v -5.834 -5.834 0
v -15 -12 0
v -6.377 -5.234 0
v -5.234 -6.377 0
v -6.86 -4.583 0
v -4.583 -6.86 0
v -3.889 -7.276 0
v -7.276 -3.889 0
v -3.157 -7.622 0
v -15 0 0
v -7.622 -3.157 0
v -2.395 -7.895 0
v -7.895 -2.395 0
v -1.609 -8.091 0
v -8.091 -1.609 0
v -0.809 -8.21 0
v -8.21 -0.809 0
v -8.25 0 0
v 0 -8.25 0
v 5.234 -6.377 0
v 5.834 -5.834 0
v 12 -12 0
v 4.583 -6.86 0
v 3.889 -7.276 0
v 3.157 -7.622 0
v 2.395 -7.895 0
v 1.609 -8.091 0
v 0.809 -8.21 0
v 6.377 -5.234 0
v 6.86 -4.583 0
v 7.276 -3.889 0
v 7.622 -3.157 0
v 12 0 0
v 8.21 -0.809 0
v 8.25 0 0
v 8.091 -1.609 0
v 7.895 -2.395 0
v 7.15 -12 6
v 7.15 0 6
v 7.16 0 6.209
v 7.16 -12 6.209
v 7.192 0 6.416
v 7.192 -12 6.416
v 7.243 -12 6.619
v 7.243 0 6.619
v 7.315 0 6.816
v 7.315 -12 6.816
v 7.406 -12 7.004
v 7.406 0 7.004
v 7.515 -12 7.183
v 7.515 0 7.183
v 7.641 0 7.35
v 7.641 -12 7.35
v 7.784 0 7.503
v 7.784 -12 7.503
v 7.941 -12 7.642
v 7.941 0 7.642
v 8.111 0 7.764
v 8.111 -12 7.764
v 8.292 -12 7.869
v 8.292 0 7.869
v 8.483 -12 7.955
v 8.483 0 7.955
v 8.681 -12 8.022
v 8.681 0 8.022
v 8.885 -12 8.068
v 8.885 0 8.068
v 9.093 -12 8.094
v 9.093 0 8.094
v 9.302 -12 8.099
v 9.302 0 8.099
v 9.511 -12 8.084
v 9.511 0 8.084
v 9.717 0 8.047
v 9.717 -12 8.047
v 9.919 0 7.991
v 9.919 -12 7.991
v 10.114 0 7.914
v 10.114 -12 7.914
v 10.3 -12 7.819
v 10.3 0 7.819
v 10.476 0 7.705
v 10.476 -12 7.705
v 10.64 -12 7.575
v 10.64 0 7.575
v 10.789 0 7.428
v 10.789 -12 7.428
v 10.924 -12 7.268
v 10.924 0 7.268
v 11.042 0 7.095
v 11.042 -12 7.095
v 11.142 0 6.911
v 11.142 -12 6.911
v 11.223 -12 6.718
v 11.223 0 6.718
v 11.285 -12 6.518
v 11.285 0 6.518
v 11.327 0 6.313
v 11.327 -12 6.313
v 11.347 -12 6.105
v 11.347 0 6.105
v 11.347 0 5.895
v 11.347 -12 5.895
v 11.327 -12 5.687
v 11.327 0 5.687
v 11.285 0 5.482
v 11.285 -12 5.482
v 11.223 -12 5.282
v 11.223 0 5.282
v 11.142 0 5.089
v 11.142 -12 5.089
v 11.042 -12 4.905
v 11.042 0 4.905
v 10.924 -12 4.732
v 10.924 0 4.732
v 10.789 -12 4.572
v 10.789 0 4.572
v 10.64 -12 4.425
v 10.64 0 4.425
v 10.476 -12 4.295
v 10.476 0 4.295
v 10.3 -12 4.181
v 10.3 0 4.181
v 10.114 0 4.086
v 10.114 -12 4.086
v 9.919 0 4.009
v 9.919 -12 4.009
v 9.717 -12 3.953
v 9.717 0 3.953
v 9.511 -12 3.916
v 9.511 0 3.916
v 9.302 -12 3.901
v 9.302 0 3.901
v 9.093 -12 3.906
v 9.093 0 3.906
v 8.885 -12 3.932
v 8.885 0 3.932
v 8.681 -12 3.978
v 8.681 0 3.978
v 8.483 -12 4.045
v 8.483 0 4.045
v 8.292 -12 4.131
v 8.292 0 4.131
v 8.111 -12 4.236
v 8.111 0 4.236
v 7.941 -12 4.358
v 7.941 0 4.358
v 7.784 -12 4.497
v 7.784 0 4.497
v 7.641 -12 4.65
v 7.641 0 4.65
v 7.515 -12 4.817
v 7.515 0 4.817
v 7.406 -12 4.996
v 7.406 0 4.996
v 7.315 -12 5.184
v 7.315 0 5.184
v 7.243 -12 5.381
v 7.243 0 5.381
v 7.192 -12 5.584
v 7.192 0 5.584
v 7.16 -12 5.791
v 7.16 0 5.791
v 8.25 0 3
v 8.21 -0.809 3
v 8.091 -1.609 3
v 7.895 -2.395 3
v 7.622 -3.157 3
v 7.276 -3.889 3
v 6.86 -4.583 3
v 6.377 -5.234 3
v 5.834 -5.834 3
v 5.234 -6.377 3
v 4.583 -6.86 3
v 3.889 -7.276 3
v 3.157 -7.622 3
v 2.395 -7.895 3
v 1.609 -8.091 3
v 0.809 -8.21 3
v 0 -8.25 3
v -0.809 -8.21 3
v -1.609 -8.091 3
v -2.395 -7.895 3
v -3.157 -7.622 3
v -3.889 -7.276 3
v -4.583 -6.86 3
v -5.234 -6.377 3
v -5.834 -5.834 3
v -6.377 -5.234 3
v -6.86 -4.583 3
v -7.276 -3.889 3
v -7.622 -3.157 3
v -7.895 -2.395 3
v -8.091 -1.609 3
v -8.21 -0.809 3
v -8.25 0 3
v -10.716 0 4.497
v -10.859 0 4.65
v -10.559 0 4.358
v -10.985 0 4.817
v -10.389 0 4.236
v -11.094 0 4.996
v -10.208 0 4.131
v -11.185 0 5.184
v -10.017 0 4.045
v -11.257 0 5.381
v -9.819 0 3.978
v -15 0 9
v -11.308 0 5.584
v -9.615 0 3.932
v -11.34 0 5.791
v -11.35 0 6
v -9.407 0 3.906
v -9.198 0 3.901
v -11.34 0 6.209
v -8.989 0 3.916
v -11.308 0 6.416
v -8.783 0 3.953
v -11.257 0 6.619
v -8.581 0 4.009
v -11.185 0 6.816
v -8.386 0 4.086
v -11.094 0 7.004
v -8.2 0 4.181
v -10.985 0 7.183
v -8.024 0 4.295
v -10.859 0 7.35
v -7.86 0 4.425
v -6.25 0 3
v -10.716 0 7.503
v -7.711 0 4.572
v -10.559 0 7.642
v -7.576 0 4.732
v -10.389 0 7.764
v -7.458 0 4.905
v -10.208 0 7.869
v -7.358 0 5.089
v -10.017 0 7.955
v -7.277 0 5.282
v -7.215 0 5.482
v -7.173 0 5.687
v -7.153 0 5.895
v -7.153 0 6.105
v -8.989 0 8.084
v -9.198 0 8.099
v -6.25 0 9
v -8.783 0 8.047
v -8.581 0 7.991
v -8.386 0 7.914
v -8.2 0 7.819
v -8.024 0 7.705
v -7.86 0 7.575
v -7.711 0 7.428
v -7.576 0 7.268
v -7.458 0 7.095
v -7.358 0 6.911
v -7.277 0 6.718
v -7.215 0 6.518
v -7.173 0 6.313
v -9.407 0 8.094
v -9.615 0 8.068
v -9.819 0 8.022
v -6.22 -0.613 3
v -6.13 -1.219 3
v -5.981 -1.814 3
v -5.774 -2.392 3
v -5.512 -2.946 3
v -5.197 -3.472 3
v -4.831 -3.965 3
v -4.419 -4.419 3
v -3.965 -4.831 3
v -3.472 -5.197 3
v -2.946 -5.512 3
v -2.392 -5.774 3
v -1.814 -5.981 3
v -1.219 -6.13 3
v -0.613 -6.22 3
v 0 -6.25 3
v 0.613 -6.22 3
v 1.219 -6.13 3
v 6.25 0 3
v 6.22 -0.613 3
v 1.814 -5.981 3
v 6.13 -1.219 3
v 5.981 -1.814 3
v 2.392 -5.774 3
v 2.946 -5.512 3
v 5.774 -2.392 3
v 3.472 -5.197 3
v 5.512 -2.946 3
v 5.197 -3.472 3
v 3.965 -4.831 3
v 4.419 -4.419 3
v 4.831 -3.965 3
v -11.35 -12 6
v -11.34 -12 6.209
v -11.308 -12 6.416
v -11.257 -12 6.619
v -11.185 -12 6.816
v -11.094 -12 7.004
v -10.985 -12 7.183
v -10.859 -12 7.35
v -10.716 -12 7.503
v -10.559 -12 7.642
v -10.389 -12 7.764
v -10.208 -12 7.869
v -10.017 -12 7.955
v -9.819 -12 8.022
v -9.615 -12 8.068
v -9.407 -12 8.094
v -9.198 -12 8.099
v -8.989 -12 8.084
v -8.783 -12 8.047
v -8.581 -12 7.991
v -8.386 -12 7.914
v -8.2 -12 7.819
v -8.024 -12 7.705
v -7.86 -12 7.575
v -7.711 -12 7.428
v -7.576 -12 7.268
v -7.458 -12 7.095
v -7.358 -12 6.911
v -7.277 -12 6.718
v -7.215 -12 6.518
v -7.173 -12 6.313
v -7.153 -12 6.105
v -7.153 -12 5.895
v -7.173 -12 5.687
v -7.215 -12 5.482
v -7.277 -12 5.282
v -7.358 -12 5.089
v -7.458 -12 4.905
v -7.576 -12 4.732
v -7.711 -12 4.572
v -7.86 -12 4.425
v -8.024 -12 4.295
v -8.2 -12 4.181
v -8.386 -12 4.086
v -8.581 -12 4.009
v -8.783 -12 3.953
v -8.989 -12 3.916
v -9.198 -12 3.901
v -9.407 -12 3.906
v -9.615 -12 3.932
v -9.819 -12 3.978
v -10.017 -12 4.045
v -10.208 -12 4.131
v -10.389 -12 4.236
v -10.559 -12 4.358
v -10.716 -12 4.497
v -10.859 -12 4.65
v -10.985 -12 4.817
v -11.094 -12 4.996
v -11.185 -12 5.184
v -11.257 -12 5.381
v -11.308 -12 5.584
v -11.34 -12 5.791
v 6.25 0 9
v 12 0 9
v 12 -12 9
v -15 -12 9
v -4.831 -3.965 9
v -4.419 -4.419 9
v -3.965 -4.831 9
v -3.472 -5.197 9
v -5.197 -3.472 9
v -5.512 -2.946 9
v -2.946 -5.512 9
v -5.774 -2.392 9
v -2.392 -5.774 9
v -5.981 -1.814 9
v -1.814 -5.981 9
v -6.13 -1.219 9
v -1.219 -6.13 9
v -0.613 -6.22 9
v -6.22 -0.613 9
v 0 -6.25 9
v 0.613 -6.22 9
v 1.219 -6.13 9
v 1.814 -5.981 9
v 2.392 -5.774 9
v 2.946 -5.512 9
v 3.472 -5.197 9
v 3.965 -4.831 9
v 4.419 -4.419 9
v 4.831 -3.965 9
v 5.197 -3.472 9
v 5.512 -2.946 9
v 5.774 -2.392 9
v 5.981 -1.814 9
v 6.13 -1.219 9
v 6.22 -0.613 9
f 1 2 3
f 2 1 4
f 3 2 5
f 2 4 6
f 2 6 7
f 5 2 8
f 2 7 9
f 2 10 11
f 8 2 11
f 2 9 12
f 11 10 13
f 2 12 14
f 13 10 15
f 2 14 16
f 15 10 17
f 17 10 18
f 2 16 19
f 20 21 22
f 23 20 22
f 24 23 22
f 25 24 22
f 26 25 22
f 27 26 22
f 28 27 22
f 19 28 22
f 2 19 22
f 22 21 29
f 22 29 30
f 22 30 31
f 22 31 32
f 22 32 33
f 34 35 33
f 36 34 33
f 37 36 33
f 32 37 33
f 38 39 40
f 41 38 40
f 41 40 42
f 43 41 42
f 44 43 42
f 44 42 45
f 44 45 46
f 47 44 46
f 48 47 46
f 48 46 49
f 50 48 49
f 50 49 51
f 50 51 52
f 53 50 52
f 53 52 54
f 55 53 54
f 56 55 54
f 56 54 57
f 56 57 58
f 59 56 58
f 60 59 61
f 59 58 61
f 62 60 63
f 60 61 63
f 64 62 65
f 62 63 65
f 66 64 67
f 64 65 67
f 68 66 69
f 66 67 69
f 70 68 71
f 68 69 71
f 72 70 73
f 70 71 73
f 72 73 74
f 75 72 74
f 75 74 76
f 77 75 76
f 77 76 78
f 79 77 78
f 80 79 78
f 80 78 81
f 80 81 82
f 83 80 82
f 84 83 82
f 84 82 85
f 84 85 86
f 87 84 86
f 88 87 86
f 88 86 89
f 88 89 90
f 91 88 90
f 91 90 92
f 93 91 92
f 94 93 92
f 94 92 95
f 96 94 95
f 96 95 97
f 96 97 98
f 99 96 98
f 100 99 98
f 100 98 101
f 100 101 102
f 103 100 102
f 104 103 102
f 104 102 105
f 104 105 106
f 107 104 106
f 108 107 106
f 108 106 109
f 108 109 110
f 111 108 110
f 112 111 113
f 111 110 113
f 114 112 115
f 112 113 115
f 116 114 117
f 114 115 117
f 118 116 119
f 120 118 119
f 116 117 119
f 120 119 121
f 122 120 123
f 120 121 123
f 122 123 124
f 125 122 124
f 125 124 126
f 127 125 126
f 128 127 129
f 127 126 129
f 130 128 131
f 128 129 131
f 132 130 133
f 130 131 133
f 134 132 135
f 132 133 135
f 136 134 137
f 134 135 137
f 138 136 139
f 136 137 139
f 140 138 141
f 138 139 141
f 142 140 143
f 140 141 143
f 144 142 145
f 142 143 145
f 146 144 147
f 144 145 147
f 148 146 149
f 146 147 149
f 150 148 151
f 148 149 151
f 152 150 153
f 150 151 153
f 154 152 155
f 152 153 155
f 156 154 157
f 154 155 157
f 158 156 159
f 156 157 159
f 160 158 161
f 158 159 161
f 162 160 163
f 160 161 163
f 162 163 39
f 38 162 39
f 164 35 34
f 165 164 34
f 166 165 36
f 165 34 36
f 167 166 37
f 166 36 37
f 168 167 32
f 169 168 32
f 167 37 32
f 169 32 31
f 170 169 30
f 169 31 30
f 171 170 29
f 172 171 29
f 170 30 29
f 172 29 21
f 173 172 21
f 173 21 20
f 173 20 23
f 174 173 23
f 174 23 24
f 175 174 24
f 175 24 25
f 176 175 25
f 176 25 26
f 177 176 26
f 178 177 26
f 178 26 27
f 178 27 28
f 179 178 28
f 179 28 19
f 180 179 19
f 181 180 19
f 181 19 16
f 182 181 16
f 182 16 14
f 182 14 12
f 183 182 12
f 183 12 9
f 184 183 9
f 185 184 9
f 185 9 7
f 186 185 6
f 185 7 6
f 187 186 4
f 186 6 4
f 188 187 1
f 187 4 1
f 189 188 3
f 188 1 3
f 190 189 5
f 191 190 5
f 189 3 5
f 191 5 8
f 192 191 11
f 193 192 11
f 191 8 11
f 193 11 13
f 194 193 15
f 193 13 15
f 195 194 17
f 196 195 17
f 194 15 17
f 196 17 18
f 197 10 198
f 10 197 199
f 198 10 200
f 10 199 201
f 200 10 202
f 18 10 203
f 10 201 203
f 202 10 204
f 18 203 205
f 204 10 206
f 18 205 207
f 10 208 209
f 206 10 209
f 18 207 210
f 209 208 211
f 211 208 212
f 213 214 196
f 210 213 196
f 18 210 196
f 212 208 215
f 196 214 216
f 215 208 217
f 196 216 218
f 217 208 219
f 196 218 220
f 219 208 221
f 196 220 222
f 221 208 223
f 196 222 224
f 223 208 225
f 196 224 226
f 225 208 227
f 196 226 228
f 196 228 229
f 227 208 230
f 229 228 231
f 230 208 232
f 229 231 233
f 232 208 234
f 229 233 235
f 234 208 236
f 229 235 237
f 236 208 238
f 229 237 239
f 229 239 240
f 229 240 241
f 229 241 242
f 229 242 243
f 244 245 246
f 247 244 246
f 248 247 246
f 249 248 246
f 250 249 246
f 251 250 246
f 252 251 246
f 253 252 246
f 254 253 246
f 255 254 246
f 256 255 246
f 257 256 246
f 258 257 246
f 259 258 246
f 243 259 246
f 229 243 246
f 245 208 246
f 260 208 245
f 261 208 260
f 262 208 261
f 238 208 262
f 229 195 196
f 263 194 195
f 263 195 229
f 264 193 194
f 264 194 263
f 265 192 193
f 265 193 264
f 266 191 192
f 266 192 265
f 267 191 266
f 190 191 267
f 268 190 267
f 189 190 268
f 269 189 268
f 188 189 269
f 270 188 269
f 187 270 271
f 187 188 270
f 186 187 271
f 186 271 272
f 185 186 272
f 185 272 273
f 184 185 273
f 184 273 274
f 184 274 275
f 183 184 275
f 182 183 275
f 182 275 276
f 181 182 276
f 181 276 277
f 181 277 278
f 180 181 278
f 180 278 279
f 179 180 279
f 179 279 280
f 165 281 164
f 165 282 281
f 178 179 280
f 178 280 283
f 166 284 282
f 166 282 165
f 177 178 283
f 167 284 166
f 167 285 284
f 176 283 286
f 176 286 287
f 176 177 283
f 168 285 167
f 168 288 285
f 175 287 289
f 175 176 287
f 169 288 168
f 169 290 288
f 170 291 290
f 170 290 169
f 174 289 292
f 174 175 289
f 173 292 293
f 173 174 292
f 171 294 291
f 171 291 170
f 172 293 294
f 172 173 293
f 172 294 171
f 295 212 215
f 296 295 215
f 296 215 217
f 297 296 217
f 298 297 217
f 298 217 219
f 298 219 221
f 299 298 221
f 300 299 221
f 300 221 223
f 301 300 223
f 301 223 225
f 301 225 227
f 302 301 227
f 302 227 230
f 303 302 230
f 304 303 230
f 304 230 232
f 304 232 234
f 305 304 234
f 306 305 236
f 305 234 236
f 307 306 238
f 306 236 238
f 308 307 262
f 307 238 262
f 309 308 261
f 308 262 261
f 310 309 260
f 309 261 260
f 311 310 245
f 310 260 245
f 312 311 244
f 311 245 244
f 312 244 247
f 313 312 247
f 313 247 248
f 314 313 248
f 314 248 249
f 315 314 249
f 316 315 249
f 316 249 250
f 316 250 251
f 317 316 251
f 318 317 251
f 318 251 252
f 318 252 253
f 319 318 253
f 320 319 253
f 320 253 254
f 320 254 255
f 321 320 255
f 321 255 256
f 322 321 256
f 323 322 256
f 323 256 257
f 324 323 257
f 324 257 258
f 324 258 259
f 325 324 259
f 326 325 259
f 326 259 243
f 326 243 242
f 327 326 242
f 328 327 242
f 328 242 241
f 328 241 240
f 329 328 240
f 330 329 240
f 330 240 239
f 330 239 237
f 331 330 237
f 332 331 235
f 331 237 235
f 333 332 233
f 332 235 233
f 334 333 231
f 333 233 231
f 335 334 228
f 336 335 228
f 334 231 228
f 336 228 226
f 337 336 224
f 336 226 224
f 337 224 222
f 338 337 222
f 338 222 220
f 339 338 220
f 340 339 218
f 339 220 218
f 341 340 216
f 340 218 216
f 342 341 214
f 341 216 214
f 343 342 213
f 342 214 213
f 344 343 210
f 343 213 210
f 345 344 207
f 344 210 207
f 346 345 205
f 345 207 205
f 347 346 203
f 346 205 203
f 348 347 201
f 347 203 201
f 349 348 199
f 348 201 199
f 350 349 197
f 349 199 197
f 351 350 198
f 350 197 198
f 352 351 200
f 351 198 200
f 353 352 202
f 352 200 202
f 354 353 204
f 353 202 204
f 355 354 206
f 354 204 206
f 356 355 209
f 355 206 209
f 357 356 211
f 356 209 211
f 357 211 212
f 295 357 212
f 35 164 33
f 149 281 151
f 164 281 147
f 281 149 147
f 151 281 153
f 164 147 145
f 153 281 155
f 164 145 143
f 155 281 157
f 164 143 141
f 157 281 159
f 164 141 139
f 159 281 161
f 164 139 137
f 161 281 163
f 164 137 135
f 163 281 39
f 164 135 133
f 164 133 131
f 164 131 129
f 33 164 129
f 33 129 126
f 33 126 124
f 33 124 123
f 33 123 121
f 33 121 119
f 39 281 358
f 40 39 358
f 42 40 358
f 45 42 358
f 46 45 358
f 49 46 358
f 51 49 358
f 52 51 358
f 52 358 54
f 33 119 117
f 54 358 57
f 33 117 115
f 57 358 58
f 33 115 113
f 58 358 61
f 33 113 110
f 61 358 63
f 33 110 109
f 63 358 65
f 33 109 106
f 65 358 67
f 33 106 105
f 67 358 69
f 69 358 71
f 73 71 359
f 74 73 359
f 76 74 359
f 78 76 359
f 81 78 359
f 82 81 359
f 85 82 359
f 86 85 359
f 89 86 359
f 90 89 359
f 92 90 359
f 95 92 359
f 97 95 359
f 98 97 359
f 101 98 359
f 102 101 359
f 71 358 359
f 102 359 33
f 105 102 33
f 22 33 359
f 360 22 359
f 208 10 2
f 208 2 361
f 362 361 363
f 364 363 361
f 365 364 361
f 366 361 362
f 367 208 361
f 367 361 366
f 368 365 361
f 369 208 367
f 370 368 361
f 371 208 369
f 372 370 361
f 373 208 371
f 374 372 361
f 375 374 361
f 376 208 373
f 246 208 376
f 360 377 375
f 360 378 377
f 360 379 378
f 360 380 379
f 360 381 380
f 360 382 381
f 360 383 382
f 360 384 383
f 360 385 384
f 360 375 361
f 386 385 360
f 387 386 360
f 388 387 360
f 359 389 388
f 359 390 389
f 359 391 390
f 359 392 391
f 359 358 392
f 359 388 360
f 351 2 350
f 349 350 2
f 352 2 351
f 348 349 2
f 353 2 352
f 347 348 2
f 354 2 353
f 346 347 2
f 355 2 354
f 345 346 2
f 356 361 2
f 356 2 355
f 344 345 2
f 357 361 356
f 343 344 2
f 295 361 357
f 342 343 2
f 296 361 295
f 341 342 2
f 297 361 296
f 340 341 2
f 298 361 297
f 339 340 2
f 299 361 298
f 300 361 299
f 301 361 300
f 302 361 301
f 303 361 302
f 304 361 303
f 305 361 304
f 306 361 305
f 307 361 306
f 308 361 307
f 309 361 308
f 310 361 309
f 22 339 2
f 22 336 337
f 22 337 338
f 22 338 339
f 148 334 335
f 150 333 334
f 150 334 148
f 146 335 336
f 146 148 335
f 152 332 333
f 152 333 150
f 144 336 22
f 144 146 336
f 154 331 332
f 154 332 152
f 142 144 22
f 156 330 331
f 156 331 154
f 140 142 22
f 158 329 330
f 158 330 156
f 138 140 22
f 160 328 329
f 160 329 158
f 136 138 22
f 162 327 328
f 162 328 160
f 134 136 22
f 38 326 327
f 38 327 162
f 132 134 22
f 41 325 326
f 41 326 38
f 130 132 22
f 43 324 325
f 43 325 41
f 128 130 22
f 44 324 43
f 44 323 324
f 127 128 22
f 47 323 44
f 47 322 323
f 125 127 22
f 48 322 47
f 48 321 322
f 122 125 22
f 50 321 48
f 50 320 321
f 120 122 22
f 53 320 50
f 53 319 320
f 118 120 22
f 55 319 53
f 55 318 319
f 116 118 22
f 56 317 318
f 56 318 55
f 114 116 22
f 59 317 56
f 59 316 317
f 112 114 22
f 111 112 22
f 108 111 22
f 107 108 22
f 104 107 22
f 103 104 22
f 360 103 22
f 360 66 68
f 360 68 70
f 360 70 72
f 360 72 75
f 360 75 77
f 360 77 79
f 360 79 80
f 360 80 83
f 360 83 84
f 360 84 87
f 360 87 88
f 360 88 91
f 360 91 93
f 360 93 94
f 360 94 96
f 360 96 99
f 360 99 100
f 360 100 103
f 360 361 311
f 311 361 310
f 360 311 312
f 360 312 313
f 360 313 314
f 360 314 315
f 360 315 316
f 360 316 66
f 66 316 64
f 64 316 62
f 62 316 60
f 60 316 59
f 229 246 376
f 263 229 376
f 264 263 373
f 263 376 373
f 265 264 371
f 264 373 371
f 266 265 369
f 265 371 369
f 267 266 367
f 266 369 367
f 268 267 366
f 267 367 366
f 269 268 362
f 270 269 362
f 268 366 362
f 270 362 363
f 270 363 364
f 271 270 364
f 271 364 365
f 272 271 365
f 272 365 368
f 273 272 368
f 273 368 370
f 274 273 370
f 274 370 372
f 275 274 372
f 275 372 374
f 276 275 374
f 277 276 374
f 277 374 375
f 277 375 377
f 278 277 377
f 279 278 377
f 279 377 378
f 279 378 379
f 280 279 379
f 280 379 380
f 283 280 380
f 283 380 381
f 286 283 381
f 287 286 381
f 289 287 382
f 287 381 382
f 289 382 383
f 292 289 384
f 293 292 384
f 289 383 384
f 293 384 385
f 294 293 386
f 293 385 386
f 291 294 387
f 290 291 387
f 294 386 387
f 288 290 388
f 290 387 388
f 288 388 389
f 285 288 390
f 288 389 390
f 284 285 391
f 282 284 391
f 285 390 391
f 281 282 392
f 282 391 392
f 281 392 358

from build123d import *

# Parameters (mm, degrees)
F0_W     = 27
F0_H     = 9
F1_DEPTH = 12
F2_R     = 6.25
F3_DEPTH = 9.001
F4_R     = 8.25
F5_DEPTH = 3
F6_R     = 2.1
F7_DEPTH = 12.001


with BuildPart() as f1:
    # F0 (on Front) → F1 (new body)
    with BuildSketch(Plane.XZ):
        with Locations((-1.5, 4.5)):
            Rectangle(F0_W, F0_H)
    extrude(amount=F1_DEPTH)

    # F2 (on face) → F3 (cut, through all)
    with BuildSketch(Plane.XY.offset(9)):
        Circle(F2_R)
    extrude(amount=-F3_DEPTH, mode=Mode.SUBTRACT)

    # F4 (on face) → F5 (cut)
    with BuildSketch(Plane(origin=(0, 0, 0), x_dir=(1, 0, 0), z_dir=(0, 0, -1))):
        Circle(F4_R)
    extrude(amount=-F5_DEPTH, mode=Mode.SUBTRACT)

    # F6 (on face) → F7 (cut, through all)
    with BuildSketch(Plane(origin=(0, 0, 0), x_dir=(-1, 0, 0), z_dir=(0, 1, 0))):
        with Locations((-9.25, 6)):
            Circle(F6_R)
        with Locations((9.25, 6)):
            Circle(F6_R)
    extrude(amount=-F7_DEPTH, mode=Mode.SUBTRACT)


solid = f1.part
